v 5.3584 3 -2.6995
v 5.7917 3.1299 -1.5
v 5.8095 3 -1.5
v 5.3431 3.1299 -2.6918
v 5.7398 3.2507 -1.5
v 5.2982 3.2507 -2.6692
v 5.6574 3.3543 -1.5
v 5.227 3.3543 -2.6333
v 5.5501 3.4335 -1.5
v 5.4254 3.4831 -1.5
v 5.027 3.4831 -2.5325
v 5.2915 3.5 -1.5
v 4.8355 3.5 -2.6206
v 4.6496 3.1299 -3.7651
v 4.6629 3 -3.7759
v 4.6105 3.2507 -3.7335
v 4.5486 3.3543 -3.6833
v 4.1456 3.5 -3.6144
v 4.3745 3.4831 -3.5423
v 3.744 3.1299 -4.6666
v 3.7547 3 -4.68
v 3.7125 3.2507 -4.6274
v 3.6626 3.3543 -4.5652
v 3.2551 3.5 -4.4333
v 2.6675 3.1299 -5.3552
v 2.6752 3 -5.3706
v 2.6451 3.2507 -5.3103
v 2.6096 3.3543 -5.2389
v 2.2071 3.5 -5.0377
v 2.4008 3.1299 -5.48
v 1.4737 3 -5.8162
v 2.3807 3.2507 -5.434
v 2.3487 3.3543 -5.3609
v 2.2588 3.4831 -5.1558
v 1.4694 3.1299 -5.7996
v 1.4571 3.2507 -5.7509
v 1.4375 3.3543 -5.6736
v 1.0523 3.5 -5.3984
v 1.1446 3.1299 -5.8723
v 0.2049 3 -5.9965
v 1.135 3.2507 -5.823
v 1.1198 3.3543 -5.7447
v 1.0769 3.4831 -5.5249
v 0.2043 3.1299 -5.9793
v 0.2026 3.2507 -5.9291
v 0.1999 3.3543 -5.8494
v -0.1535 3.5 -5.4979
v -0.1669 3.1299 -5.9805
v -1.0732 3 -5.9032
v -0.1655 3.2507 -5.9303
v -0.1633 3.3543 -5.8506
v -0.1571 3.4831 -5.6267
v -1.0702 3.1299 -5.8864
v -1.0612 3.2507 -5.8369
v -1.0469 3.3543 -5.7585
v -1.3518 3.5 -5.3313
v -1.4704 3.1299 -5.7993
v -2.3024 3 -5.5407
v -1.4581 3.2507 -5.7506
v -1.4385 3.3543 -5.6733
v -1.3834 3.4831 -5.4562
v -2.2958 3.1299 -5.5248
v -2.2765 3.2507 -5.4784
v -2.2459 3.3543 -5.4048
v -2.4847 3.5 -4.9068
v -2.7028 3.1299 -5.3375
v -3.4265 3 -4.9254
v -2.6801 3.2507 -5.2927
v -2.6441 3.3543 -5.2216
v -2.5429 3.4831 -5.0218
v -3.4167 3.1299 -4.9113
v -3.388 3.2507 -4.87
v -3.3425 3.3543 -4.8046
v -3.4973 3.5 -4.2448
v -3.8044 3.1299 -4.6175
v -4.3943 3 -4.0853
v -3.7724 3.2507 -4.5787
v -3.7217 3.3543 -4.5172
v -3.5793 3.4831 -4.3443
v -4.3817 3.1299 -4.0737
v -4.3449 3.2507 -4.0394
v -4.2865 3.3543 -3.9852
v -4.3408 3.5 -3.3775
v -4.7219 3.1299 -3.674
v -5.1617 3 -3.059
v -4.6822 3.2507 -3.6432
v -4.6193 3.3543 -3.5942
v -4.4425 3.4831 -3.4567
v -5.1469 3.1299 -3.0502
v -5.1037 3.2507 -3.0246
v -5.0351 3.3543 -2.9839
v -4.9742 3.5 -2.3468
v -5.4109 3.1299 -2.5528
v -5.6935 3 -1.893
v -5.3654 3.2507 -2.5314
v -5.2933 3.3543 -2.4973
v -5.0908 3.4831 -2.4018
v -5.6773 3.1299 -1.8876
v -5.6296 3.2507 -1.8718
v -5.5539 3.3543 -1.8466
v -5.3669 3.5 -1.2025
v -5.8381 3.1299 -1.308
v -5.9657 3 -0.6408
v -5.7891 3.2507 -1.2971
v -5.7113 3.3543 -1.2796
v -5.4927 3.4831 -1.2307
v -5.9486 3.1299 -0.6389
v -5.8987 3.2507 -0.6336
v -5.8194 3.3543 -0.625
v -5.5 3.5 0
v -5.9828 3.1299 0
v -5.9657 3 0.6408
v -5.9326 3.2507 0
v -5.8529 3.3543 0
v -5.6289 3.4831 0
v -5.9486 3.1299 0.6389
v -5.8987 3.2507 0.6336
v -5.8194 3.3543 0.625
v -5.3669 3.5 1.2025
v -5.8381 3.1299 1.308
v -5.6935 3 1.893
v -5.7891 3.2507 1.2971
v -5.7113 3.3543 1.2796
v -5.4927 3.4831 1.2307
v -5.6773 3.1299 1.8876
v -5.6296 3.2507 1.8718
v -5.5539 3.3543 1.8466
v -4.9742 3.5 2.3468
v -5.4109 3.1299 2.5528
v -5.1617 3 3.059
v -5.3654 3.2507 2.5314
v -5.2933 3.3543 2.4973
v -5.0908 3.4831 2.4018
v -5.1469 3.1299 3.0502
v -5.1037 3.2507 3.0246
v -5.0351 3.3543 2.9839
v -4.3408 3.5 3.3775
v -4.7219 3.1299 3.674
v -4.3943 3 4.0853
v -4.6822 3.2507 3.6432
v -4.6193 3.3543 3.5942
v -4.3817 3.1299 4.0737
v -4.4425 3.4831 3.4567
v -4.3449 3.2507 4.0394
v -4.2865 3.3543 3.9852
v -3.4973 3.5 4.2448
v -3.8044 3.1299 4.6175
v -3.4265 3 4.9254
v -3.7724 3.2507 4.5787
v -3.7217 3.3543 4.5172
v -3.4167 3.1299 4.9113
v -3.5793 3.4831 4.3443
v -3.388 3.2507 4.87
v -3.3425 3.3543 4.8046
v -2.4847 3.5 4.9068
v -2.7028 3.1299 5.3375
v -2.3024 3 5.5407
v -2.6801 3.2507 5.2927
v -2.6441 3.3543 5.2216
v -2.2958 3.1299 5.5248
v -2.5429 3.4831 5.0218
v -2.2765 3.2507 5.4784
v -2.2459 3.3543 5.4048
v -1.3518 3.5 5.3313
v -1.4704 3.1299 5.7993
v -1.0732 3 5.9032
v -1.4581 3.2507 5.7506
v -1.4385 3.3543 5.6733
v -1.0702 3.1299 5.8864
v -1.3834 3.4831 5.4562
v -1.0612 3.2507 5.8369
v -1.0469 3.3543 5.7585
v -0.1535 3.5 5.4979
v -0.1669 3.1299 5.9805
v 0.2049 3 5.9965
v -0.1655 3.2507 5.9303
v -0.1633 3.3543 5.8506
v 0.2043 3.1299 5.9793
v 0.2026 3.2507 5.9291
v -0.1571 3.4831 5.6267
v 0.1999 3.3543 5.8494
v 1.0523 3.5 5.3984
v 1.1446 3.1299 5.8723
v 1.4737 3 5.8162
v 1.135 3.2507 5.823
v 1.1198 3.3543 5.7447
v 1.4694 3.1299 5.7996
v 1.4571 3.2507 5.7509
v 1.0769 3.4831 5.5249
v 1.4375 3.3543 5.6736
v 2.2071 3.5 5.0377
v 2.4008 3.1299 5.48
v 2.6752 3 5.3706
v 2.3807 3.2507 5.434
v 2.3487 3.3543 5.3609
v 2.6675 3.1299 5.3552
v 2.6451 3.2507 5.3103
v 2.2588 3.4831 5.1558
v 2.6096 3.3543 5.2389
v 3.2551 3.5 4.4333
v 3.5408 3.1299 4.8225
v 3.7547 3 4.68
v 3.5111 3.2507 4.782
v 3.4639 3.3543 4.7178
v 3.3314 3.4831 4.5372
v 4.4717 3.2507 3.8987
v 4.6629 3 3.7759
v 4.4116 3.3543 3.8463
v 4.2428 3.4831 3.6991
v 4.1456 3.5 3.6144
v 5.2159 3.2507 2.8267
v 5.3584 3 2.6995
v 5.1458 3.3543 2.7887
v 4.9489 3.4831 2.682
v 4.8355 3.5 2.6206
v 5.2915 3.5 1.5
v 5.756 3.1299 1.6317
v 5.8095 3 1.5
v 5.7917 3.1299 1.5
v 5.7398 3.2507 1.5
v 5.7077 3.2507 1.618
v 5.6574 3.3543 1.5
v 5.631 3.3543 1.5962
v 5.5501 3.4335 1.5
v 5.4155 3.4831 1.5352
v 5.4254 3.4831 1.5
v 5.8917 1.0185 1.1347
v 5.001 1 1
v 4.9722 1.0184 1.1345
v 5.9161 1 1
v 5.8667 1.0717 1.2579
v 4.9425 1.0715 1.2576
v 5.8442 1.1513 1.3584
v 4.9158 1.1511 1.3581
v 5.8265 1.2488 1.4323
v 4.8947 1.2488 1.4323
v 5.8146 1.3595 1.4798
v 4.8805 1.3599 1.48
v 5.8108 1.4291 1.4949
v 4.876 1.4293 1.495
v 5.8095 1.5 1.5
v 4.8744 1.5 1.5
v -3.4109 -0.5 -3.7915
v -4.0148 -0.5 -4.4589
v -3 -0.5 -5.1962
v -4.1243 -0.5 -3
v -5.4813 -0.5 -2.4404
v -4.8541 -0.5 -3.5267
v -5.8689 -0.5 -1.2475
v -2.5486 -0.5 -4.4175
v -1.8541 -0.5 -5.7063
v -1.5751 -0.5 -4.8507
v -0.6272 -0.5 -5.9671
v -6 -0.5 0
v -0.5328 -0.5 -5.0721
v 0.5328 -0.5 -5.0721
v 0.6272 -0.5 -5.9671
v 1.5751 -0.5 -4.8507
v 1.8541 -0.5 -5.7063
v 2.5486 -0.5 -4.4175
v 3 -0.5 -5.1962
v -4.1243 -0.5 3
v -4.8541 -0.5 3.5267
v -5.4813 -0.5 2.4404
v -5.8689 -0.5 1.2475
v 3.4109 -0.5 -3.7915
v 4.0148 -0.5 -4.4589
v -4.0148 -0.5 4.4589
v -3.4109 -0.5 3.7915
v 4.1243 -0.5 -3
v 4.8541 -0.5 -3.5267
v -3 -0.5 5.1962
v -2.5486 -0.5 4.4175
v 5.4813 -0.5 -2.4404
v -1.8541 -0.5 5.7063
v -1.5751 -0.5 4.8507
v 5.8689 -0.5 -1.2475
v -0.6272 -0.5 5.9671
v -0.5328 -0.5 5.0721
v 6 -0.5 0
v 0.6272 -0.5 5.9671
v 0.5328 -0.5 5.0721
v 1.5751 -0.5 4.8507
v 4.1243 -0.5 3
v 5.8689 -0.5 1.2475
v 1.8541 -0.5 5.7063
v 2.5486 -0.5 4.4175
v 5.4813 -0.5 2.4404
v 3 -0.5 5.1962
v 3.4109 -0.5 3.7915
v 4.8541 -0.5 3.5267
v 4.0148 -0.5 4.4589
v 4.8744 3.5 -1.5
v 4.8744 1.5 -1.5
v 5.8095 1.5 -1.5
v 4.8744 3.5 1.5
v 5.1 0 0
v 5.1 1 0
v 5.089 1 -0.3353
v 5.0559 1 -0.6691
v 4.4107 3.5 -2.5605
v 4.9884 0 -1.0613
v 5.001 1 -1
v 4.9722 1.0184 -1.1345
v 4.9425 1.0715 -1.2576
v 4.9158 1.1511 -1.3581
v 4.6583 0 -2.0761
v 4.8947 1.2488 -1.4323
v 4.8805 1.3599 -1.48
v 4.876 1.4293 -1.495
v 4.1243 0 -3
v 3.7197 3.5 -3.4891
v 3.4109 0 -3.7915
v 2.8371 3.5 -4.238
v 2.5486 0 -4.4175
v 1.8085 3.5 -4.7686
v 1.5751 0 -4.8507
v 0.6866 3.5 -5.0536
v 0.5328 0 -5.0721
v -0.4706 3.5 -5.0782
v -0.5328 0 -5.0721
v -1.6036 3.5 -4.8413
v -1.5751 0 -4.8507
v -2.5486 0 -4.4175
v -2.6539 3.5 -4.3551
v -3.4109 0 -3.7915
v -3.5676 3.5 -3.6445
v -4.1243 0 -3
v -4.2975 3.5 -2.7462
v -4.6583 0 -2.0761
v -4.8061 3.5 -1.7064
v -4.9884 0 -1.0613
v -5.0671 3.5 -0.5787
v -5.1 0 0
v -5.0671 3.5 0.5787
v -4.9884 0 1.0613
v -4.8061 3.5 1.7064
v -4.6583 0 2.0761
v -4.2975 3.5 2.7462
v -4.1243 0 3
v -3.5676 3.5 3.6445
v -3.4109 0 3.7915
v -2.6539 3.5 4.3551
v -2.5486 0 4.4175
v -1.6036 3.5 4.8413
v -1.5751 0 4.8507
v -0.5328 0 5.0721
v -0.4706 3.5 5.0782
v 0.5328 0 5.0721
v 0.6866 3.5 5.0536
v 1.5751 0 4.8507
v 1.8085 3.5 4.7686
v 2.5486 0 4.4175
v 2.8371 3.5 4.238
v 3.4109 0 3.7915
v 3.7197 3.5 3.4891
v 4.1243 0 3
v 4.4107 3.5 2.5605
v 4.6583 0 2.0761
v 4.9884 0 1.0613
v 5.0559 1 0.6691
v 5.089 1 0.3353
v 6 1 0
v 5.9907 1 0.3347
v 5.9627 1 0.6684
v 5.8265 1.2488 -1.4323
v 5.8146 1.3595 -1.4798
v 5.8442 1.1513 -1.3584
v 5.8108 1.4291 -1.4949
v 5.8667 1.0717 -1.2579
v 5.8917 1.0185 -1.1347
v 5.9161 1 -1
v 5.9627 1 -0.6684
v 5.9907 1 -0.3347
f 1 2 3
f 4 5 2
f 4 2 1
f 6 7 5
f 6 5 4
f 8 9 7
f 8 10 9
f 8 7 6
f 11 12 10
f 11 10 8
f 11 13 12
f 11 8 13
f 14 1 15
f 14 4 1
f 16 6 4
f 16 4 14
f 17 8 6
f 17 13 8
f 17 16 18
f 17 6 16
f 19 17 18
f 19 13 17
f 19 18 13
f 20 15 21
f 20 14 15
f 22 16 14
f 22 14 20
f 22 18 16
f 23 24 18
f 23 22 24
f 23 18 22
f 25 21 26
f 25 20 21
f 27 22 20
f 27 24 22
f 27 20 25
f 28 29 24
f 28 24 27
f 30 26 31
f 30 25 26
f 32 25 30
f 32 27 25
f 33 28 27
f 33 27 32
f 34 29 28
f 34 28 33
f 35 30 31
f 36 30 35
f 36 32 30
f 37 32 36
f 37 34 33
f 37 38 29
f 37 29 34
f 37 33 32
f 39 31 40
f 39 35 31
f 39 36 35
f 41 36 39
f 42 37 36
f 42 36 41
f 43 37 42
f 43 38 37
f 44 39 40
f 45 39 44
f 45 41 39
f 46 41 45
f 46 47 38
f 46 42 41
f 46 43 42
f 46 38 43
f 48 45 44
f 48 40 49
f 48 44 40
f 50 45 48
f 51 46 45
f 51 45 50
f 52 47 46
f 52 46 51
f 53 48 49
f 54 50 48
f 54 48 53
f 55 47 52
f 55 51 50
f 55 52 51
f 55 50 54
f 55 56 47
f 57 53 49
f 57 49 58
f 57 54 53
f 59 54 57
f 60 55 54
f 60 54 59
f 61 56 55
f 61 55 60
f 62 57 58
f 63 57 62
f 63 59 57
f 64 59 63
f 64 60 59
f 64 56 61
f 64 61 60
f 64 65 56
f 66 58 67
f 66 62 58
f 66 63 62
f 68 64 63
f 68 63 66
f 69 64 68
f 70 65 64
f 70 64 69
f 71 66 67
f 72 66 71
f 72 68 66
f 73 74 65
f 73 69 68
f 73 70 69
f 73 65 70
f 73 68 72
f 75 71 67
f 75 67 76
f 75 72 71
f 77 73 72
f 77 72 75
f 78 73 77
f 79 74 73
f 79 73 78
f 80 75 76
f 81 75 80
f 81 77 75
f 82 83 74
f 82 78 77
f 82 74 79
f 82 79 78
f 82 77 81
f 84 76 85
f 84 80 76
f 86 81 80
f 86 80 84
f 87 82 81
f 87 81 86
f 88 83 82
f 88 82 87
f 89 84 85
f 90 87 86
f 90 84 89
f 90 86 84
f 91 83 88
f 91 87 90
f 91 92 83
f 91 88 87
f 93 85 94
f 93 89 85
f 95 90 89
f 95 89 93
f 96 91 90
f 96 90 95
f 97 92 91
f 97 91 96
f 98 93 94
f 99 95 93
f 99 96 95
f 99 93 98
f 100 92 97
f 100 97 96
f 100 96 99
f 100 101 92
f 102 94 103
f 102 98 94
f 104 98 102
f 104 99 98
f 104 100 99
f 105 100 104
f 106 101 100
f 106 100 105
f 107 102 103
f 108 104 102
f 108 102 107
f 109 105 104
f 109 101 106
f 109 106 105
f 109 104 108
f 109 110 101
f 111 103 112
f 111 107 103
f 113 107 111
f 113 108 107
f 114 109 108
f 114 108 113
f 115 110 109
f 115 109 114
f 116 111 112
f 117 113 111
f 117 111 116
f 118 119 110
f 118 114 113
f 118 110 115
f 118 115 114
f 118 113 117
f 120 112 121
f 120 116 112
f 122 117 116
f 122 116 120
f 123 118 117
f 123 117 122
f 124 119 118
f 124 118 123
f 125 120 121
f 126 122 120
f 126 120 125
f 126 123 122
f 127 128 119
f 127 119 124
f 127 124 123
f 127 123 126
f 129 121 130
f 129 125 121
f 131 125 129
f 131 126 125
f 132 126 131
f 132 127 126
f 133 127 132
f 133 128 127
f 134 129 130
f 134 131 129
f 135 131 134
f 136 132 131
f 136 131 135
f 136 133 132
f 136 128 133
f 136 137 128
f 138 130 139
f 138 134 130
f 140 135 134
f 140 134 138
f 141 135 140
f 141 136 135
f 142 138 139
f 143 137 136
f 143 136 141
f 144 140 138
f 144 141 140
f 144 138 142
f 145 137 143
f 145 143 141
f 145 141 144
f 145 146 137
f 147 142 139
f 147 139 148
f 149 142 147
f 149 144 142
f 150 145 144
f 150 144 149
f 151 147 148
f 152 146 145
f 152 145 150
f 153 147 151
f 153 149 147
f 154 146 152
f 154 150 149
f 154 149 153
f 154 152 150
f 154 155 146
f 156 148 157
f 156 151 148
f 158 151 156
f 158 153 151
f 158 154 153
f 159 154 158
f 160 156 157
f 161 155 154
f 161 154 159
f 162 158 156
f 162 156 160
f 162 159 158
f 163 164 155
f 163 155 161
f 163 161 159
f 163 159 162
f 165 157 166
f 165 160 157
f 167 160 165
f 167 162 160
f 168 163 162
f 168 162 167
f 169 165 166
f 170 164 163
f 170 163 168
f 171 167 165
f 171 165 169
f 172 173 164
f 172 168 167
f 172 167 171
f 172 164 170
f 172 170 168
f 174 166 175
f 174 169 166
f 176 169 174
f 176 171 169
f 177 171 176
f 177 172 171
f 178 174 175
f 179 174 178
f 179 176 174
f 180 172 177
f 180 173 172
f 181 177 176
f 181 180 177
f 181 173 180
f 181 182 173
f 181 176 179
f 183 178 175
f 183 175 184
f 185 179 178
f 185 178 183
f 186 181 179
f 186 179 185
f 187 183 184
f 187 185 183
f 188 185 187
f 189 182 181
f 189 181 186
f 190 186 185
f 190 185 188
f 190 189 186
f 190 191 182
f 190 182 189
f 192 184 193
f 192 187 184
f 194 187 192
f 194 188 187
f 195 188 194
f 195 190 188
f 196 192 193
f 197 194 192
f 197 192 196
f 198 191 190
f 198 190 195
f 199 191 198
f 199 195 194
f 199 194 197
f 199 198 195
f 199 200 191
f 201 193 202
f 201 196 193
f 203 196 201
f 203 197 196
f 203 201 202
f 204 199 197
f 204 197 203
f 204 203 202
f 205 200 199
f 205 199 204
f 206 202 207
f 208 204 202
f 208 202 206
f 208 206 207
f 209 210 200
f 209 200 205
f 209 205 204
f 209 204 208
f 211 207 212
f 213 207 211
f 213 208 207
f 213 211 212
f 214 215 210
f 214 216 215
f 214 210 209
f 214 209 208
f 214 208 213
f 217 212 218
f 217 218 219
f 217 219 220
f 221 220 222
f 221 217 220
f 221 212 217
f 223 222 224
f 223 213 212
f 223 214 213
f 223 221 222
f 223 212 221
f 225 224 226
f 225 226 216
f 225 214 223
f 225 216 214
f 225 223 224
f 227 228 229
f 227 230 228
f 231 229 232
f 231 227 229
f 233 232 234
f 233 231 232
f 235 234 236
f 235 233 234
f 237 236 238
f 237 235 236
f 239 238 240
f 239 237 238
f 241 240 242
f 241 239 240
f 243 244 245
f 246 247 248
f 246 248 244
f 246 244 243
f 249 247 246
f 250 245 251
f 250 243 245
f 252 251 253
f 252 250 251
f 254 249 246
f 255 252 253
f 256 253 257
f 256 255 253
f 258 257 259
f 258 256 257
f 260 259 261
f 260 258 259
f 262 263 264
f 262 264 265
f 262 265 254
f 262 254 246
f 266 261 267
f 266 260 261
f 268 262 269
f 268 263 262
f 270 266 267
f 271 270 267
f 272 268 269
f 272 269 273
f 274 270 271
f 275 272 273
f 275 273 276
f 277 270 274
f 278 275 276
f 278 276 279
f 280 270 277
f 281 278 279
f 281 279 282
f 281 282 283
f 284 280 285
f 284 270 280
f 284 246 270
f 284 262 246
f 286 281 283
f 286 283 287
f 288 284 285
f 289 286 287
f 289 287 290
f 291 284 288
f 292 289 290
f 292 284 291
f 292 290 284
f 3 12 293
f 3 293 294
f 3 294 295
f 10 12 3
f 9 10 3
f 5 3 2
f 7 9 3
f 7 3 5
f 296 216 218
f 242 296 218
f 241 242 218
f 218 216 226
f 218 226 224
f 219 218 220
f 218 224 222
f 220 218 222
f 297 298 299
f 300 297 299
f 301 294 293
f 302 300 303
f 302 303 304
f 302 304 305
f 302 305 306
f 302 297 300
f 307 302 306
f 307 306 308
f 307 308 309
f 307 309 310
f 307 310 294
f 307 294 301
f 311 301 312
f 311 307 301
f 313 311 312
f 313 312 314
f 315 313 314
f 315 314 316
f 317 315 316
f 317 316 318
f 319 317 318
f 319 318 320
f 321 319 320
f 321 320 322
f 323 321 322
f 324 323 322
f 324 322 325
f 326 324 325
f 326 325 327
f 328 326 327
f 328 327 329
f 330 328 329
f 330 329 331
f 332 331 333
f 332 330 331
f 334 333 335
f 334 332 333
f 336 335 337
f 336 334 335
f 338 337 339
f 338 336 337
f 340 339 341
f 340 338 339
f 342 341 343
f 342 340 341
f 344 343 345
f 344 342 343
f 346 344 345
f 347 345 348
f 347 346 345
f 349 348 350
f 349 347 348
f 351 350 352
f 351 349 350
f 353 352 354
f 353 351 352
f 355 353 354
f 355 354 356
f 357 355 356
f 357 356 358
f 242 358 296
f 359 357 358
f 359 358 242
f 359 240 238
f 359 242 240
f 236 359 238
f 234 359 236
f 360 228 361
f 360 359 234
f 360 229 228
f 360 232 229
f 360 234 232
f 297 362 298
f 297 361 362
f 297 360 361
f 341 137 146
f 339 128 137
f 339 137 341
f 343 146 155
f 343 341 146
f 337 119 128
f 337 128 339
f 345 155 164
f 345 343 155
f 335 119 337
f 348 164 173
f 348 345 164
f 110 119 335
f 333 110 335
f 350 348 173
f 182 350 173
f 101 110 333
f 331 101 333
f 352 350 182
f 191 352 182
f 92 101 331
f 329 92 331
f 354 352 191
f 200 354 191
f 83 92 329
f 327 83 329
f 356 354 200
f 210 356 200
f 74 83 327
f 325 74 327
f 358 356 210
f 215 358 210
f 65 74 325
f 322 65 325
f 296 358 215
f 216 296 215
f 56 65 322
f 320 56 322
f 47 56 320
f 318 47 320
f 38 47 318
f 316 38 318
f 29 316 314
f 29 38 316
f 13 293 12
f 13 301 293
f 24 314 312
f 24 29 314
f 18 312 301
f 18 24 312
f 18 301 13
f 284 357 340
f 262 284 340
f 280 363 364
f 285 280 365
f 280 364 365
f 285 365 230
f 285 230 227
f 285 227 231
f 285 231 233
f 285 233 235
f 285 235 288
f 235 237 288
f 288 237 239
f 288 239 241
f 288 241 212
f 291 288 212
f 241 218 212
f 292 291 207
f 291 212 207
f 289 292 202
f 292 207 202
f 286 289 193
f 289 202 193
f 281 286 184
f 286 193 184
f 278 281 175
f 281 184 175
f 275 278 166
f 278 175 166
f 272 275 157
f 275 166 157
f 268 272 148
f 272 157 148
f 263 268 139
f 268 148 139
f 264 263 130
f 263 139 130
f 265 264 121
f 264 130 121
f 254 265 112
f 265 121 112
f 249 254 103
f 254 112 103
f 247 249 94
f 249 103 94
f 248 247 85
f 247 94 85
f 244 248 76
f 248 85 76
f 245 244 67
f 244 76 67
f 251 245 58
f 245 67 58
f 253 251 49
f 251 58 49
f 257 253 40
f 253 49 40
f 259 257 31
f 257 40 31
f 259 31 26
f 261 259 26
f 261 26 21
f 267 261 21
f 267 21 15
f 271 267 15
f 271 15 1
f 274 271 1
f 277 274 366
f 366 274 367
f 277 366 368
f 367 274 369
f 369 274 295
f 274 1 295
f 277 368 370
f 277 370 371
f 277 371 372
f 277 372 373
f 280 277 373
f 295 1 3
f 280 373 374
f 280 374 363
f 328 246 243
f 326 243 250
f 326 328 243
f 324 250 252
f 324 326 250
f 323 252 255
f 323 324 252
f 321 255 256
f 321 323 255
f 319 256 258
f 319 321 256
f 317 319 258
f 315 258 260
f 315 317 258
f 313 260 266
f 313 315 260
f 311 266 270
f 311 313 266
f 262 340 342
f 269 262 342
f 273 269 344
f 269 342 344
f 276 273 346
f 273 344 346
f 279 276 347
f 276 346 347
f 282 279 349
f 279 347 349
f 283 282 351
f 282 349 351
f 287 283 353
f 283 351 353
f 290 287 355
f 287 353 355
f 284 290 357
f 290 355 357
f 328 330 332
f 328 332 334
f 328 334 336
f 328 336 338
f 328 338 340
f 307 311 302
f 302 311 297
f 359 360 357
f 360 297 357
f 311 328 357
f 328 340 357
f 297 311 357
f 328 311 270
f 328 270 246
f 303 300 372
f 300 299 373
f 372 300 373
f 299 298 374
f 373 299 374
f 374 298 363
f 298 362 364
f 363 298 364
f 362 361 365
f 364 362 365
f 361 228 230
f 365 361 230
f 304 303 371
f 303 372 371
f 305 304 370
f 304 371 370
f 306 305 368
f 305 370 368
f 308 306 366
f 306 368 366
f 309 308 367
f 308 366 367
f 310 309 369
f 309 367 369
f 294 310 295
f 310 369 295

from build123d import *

# Parameters (mm, degrees)
SKETCH1_R           = 6
SKETCH1_R_2         = 5.1
BOSS_EXTRUDE1_DEPTH = 3.5
SKETCH4_R           = 6
BOSS_EXTRUDE2_DEPTH = 0.5
SKETCH5_W           = 6
SKETCH5_H           = 3
CUT_EXTRUDE3_DEPTH  = 2.5
CUT_EXTRUDE4_DEPTH  = 1.5
FILLET1_R           = 0.5


with BuildPart() as part:
    # Sketch1 → Boss-Extrude1 (new body)
    with BuildSketch(Plane(origin=(0, 0, 0), x_dir=(1, 0, 0), z_dir=(0, 1, 0))):
        Circle(SKETCH1_R)
        Circle(SKETCH1_R_2, mode=Mode.SUBTRACT)
    extrude(amount=BOSS_EXTRUDE1_DEPTH)

    # Sketch4 → Boss-Extrude2 (add)
    with BuildSketch(Plane.XZ):
        Circle(SKETCH4_R)
    extrude(amount=BOSS_EXTRUDE2_DEPTH)

    # Sketch5 → Cut-Extrude3 (cut)
    with BuildSketch(Plane.XZ.offset(-3.5)):
        with Locations((3, 0)):
            Rectangle(SKETCH5_W, SKETCH5_H)
    extrude(amount=CUT_EXTRUDE3_DEPTH, mode=Mode.SUBTRACT)

    # Sketch7 → Cut-Extrude4 (cut, through all)
    with BuildSketch(Plane(origin=(0, 0, 0), x_dir=(1, 0, 0), z_dir=(0, 1, 0))):
        with BuildLine():
            Line((4.124318125, -3), (-4.124318125, -3))
            ThreePointArc((-4.124318125, -3), (0, -5.1), (4.124318125, -3))
        make_face()
        with BuildLine():
            Line((4.124318125, 3), (-4.124318125, 3))
            ThreePointArc((-4.124318125, 3), (0, 5.1), (4.124318125, 3))
        make_face()
    extrude(amount=-CUT_EXTRUDE4_DEPTH, mode=Mode.SUBTRACT)

    # Fillet1
    fillet1_edges = [part.edges().sort_by_distance(p)[0] for p in [
        (-6, 3.5, 0),
        (5.341949031, 1, -1.5),
        (5.341949031, 1, 1.5),
    ]]
    fillet(fillet1_edges, radius=FILLET1_R)


solid = part.part
